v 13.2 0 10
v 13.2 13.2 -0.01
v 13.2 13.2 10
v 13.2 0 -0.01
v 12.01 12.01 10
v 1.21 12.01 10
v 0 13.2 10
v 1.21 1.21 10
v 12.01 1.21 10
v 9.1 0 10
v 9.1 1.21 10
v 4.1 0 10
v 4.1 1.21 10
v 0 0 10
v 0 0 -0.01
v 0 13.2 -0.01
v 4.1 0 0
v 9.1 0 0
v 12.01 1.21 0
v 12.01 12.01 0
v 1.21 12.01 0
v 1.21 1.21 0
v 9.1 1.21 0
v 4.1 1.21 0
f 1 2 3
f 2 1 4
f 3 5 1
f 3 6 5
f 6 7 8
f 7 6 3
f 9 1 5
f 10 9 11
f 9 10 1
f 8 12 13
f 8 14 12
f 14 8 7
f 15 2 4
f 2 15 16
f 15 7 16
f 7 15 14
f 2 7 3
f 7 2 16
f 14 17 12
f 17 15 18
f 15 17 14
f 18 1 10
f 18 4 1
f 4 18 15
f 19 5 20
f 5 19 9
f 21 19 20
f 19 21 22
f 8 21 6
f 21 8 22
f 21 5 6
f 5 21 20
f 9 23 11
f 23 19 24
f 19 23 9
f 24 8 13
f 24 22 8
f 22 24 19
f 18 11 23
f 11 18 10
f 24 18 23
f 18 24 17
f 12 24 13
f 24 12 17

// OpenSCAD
// file: ../../Base/Rotation.scad
// Fischertechnik Box Foundation
// Geometry Helpers Rotation

include <PlacementOptions.scad>

// getRotatedSpace(space, rotation=NoRotation)
// Rotates the space dependent on the specified rotation

function getRotatedSpace(space, rotation=NoRotation) = [
    (rotation == Rotate90 || rotation == Rotate270) ? space.y : space.x,
    (rotation == Rotate90 || rotation == Rotate270) ? space.x : space.y
];

// Rotates the given space around the fixed left lower corner
// space = the space the children needs as width/depth list [width,depth]
// rotation = 0 Rotate0 degrees, 1 Rotate90 degrees, 2 Rotate180 degrees, 3 Rotate270 degrees (equivalent to -90)

module RotateFix(space, rotation=NoRotation) {
    dy = (rotation == Rotate0 || rotation == Rotate270) ? 0 :
        (rotation == Rotate90) ? space.x :
        space.y;
    dx = (rotation < Rotate180) ? 0 :
        (rotation == Rotate180) ? space.x :
        space.y;
    
    translate([dx, dy, 0])
        rotate([0, 0, rotations[rotation]])
            children();
}
// file: ../../Base/Alignment.scad
// Fischertechnik Box Foundation
// Geometry Helpers Alignment

include <PlacementOptions.scad>

// getAlignedX(elementWidth, spaceWidth, align=AlignRight, offset=0)
// Gets the aligned X offset of an element with the given
// width in the given space.
// elementWidth = The width of the element to positon
// spaceWidth = The space where the element should be aligned
// align = 0 AlignLeft, 1 AlignCenter, 2 AlignRight
// offset = an optional offset from the aligned position. When
// aligned left or centered, then positive values are in X direction.
// When aligned right then positive values are in negative X direction.

function getAlignedX(elementWidth, spaceWidth, align=AlignRight, offset=0) =
    (align == AlignLeft) ?
        offset :
        ((align == AlignCenter) ?
        (spaceWidth - elementWidth)/2 + offset :
        spaceWidth - offset - elementWidth);

// getAlignedY(elementDepth, spaceDepth, align=AlignTop, offset=0)
// Gets the aligned Y offset of an element with the given
// depth in the given space.
// elementDepth = The depth of the element to positon
// spaceDepth = The space where the element should be aligned
// align = 0 AlignBottom, 1 AlignCenter, 2 AlignTop
// offset = an optional offset from the aligned position. When
// aligned bottom or centered, then positive values are in Y direction.
// When aligned top then positive values are in negative Y direction.

function getAlignedY(elementDepth, spaceDepth, align=AlignTop, offset=0) =
    (align == AlignBottom) ?
        offset :
        ((align == AlignCenter) ?
        (spaceDepth - elementDepth)/2 + offset :
        spaceDepth - offset - elementDepth);
// file: ../../Base/PlacementOptions.scad
// Fischertechnik Box Foundation
// Placement Options

// Alignment
NoAlign = 0;
AlignLeft = 1;
AlignBottom = 2;
AlignCenter = 3;
AlignRight = 4;
AlignTop = 5;

// Element rotation degree steps
rotations = [0, -90, -180, -270];

// Rotation
NoRotation = 0;
Rotate0 = 0;
Rotate90 = 1;
Rotate180 = 2;
Rotate270 = 3;

// Docking (seen from above)
NoDock = -1;
DockLeft = 0;
DockTop = 1;
DockRight = 2;
DockCorner = 2;
DockBottom = 3;

// Web corners
LowerLeft = 0;
UpperLeft = 1;
UpperRight = 2;
LowerRight = 3;

// Web position relative to corner
LeftOfCorner = 0;
RightOfCorner = 1;
// file: ../../Base/Boxes.scad
// Fischertechnik Box Foundation
// Pre-designed Boxes

use <Constants.scad>

include <PlacementOptions.scad>

box190Width = 190;
box190Depth = 130;
box130Width = 130;
box130Depth = 95;

// Values are from an original ec3 box
topBottomDifference = 1.5;
outerHeight = 40;
baseThickness = 1.8;
innerHeight = outerHeight - baseThickness;
stackExcess = 5.7;
radius = 3.5;
wallThickness = 1.5;
tolerance = 0.2;

boxWallThickness = wallThickness;
boxBaseThickness = baseThickness;
boxWebWidth = 3.0;

// getBoxWallThickness()
// Gets the wall thickness of a Fischertechnik Box
function getBoxWallThickness() = boxWallThickness;

// getBoxUsageHeight(height = 38.2)
// Gets the usable height of a Fischertechnik box
// height = Outer height of the box from the bottom to the upper edge.
function getBoxUsageHeight(height = outerHeight) = height - baseThickness - stackExcess;

// getBoxInnerHeight()
// Gets the inner height of a Fischertechnik box, including the stack excess
function getBoxInnerHeight() = innerHeight;

// getBoxBaseThickness()
// Gets the thickness of the Fischertechnik box base.
function getBoxBaseThickness() = boxBaseThickness;

// getBoxWebWidth()
// Gets the width of a box web
function getBoxWebWidth() = boxWebWidth;

// getBox190Space()
// Gets the usable inner space of a Box 190 as an x/y-list
function getBox190Space() = [
    box190Width - 2*getBoxWallThickness() - topBottomDifference, 
    box190Depth - 2*getBoxWallThickness() - topBottomDifference ];

// RoundedCornerPlate(width, depth, height, radius)
// Creates a body plate with rounded corners for a box. Used
// also to create the complete box with the hull module.
// width = Width of the plate
// depth = depth of the plate 
// height = thickness of the plate
// radius = radius of the rounded corner
module RoundedCornerPlate(width, depth, height, radius) {
    translate([radius, radius])
    hull() {
        w = width-2*radius;
        d = depth-2*radius;
        cube([w, d, height]);
        cylinder(height, r=radius, $fn=getFragments());
        translate([w, 0])
            cylinder(height, r=radius, $fn=getFragments());
        translate([w, d])
            cylinder(height, r=radius, $fn=getFragments());
        translate([0, d])
            cylinder(height, r=radius, $fn=getFragments());
    }
}

// BoxBase(width, depth)
// Creates an empty stackable Fischertechnik compatible box
// width = Outer width of the box (190, 130, ...)
// depth = Outer depth of the box (130, 95, ...)

module BoxBase(width, depth, height=outerHeight) {    
    thinPlate = 0.01;

    innerHeight = height - baseThickness;    
    
    module Body(tolerance=tolerance) {
        hull() {
            // Bottom with tolerance to fit into the original boxes when stacked
            translate([-wallThickness+tolerance, -wallThickness+tolerance, -baseThickness])
                RoundedCornerPlate(width-topBottomDifference-2*tolerance, depth-topBottomDifference-2*tolerance, thinPlate, radius);
            
            // Top
            translate([-wallThickness-topBottomDifference/2, -wallThickness-topBottomDifference/2, innerHeight-thinPlate])
                RoundedCornerPlate(width, depth, thinPlate, radius);
         }
    }

    module Cutoff() {
        hull() {
            coWidth = width - 2*wallThickness;
            coDepth = depth - 2*wallThickness;
            
            // Bottom
            RoundedCornerPlate(coWidth-topBottomDifference, coDepth-topBottomDifference, thinPlate, radius);

            // Top
            translate([-topBottomDifference/2, -topBottomDifference/2, innerHeight+thinPlate]) 
                RoundedCornerPlate(coWidth, coDepth, thinPlate, radius);
        }
    }
    
    difference() {        
        Body();
        Cutoff();
        stackOffset = innerHeight - stackExcess;
        translate([0, 0, stackOffset + baseThickness])
            Body(tolerance=0);
    }
}

// Creates the Fischertechnik empty box 130x190 mm and places it at position 0,0
// 190x130 are the outer sizes, the inner space is slightly smaller. Use getBox190Space() to get the inner sizes.
// The box is positioned that the usable inner space is at the 0,0,0 position.

module Box190() {
    BoxBase(box190Width, box190Depth);
}

// Gets the usable inner space of a Box 130 as an x/y-list
function getBox130Space() = [
    box130Width - 2*getBoxWallThickness() - topBottomDifference, 
    box130Depth - 2*getBoxWallThickness() - topBottomDifference ];

// Creates the Fischertechnik empty box 95x130 mm and places it at position 0,0
// 190x130 are the outer sizes, the inner space is slightly smaller. Use getBox190Space() to get the inner sizes.
// The box is positioned that the usable inner space is at the 0,0,0 position.

module Box130() {
    BoxBase(box130Width, box130Depth);
}

// Creates a web at the specified box walls
// corner 0 = LowerLeft, 1 = UpperLeft, 2 = UpperRight, 3 = LowerRight
// side 0 = LeftOfCorner, 1 = RightOfCorner
// distance = Distance in mm from the corner
// boxSpace = inner width and depth of the box (default: Box 190)
// webWidth = length of the web (default is 3 mms)
// webThickness = thickness of the web (default is 1 mm)
// height = Height of the web (standard is getBoxUsageHeight())
// sink = How much of the web is sunk into the wall

module BoxWeb(
    corner, 
    side, 
    distance, 
    boxSpace=getBox190Space(), 
    webWidth=getBoxWebWidth(), 
    webThickness=1.0, 
    height=getBoxUsageHeight(),
    sink = getBoxWallThickness()/2) {
    width = (corner % 2 == 0) ? 
            (side == LeftOfCorner ? webWidth : webThickness) :
            (side == LeftOfCorner ? webThickness : webWidth);

    depth = (corner % 2 == 0) ? 
            (side == RightOfCorner ? webWidth : webThickness) :
            (side == RightOfCorner ? webThickness : webWidth);
    
    xDiff = corner == LowerLeft ? 
                (side == LeftOfCorner ? -sink : distance) :
            (corner == UpperLeft ?                
                (side == LeftOfCorner ? distance : -sink) :
            (corner == UpperRight ?
                (side == LeftOfCorner ? boxSpace.x-webWidth+sink : boxSpace.x-distance-webThickness) :
                (side == LeftOfCorner ? boxSpace.x-distance-webThickness: boxSpace.x-webWidth+sink)));

    yDiff = corner == LowerLeft ? 
                (side == RightOfCorner ? -sink : distance) :
            (corner == UpperLeft ?
                (side == RightOfCorner ? boxSpace.y-distance-webThickness : boxSpace.y-webWidth+sink) :
            (corner == UpperRight ?
                (side == RightOfCorner ? boxSpace.y-webWidth+sink : boxSpace.y-distance-webThickness) :
                (side == RightOfCorner ? distance : -sink)));
    
    translate([xDiff, yDiff, -getExcess()])
        cube([width, depth, height + 2*getExcess()]);
}
// file: ../../Base/Placement.scad
// Fischertechnik Box Foundation
// Geometry Helpers Placement

use <Constants.scad>
use <Alignment.scad>
use <Rotation.scad>
use <Boxes.scad>

include <PlacementOptions.scad>

// Place(x=0, y=0, elementSpace=[0,0], alignX=AlignLeft, alignY=AlignBottom, rotation=Rotate0, boxSpace=getBox190Space())
// Places the child at the specified position
// y = Y-Position. This is a relative position when an X aligment is specified.
// x = X-Position. This is a relative position when an Y aligment is specified.
// elementSpace = space of the element to be placed [x,y]
// alignX = -1=NoAlign, 0 AlignLeft, 1 AlignCenter, 3 AlignRight (elementSpace and boxSpace required!)
// alignY = -1=NoAlign, 2 AlignBottom, 1 AlignCenter, 4 AlignTop (elementSpace and boxSpace required!)
// rotation = 0 Rotate0 0 degrees, 1 Rotate90 90 degrees, 
// 2 Rotate180 180 degrees, 3 Rotate270 270 degrees (equivalent to -90)
// boxSpace = Inner space of the box where the placement occurs [x,y] - default is Box 190x130 inner space

module Place(x=0, y=0, elementSpace=[0,0], 
  alignX=AlignLeft, alignY=AlignBottom, 
  rotation=NoRotation, boxSpace=getBox190Space()) {

    module Position(x, y, space, rotation=Rotate0) {
        translate([x, y, 0])
            RotateFix(space, rotation)
                children();
    }

    space = getRotatedSpace(elementSpace, rotation);
    alignedX = getAlignedX(space.x, boxSpace.x, alignX, x);
    alignedY = getAlignedY(space.y, boxSpace.y, alignY, y);
    Position(alignedX, alignedY, elementSpace, rotation)
        children();
}

// Center(space=getBox130Space(), elementSpace=[0,0])
// space = Space where the children is centered. For cylinder use centered=true and no elementSpace.
// elementSpace = space of the element to be centered [x,y]

module Center(space=getBox190Space(), elementSpace=[0,0]) {
    Place(elementSpace=elementSpace, boxSpace=space, alignX=AlignCenter, alignY=AlignCenter)
        children();
}

// CenterHorizontal(width=0, y=0, offset=0, space=getBox130Space())
// width = Width of the element to be placed.
// y = Y position of the element
// offset = Offset from the center position (negative will be left of the center)
// space = Space where the element is placed

module CenterHorizontal(width=0, y=0, offset=0, space=getBox190Space()) {
    Place(x=offset, y=y, elementSpace=[width, 0], boxSpace=space, alignX=AlignCenter)
        children(0);
}

// CenterVertical(depth=0, x=0, offset=0, space=getBox130Space())
// depth = Depth of the element to be placed.
// x = X position of the element
// offset = Offset from the center position (negative will be down of the center)
// space = Space where the element is placed

module CenterVertical(depth=0, x=0, offset=0, space=getBox190Space()) {
    Place(x=x, y=offset, elementSpace=[0, depth], boxSpace=space, alignY=AlignCenter)
        children(0);
}

// getIsVertical(align)
// True if the specified alignment needs a vertical orientation for a divider (AlignRight, AlignLeft)

function getIsVertical(align) = (align == AlignRight || align == AlignLeft);

// getIsHorizontal(align)
// True if the specified alignment needs a horizontal orientation for a divider (AlignTop, AlignBottom)

function getIsHorizontal(align) = (align == AlignTop || align == AlignBottom);
// file: ../../Base/Constants.scad
// Fischertechnik Box Foundation
// Constants

// Constant values necessary for multiple elements

// Base constants
dividerThickness = 1.2;
excess = 0.01;
fragments = 90;
tolerance = 0.8;

// Gets the thickness of a divider 
function getDividerThickness() = dividerThickness;

// Gets the excess that is used to merge walls into each other
function getExcess() = excess;

// Gets amount of fragments of a cylinder
function getFragments() = fragments;

// Gets the inner tolerance of a frame to each side
function getTolerance() = tolerance;


// Fischertechnik specific constants
axisDiameter = 4;
axisBottomDiameter = axisDiameter + 1;
axisTolerance = 0.2;

// Gets axis diameter of Fischertechnik axis
function getAxisDiameter() = axisDiameter;

// Gets axis diameter tolerance (subtracted for element axis)
function getAxisTolerance() = axisTolerance;

// Gets the axis diameter for standing axis
function getStandAxisDiameter() = getAxisDiameter() - getAxisTolerance();

// Gets axis bottom diameter for thicker part at the bottom
function getAxisBottomDiameter() = axisBottomDiameter;

pinHeight = 2.5;

// gets the height of a connecting pin
function getPinHeight() = pinHeight;

standardEdgeDistance = 2.5;
standardWebDistance = 11.5;
standardCornerLength = 15;

// gets the standard distance to the wall of the box for dockable frames with webs
function getStandardEdgeDistance() = standardEdgeDistance;

// gets the standard distance of each web to the corner of the dockable frame
function getStandardWebDistance() = standardWebDistance;

// gets the standard length of the corner walls of a dockable frame
function getStandardCornerLength() = standardCornerLength;

tubeWallFactor = 0.8;

// gets the wall thickness of a tube.
function getTubeWallThickness() = tubeWallFactor * getDividerThickness();

smallPartsFrameHeight = 20;

// gets the frame height for docked small parts boxes.
function getSmallPartsFrameHeight() = smallPartsFrameHeight;

hubRingDiameter = 19.5;
hubRingLevelDiameter = 21;

// gets the diameter of a tube matching the inner ring of a wheel
function getHubRingDiameter() = hubRingDiameter;

// gets the diameter of a hub tube with a thicker diameter
function getHubRingLevelDiameter() = hubRingLevelDiameter;
// main file
// Fischertechnik Box Foundation
// ModelBase
// Test FrameBottomCutoff

use <../../Base/Constants.scad>
use <../../ModelBase/Simple.scad>

cutoffWidth = 5;
offset = 0;

difference() {
    Frame([10,10,10]);
    FrameBottomCutoff([10,10,10], cutoffWidth, offset);
}
